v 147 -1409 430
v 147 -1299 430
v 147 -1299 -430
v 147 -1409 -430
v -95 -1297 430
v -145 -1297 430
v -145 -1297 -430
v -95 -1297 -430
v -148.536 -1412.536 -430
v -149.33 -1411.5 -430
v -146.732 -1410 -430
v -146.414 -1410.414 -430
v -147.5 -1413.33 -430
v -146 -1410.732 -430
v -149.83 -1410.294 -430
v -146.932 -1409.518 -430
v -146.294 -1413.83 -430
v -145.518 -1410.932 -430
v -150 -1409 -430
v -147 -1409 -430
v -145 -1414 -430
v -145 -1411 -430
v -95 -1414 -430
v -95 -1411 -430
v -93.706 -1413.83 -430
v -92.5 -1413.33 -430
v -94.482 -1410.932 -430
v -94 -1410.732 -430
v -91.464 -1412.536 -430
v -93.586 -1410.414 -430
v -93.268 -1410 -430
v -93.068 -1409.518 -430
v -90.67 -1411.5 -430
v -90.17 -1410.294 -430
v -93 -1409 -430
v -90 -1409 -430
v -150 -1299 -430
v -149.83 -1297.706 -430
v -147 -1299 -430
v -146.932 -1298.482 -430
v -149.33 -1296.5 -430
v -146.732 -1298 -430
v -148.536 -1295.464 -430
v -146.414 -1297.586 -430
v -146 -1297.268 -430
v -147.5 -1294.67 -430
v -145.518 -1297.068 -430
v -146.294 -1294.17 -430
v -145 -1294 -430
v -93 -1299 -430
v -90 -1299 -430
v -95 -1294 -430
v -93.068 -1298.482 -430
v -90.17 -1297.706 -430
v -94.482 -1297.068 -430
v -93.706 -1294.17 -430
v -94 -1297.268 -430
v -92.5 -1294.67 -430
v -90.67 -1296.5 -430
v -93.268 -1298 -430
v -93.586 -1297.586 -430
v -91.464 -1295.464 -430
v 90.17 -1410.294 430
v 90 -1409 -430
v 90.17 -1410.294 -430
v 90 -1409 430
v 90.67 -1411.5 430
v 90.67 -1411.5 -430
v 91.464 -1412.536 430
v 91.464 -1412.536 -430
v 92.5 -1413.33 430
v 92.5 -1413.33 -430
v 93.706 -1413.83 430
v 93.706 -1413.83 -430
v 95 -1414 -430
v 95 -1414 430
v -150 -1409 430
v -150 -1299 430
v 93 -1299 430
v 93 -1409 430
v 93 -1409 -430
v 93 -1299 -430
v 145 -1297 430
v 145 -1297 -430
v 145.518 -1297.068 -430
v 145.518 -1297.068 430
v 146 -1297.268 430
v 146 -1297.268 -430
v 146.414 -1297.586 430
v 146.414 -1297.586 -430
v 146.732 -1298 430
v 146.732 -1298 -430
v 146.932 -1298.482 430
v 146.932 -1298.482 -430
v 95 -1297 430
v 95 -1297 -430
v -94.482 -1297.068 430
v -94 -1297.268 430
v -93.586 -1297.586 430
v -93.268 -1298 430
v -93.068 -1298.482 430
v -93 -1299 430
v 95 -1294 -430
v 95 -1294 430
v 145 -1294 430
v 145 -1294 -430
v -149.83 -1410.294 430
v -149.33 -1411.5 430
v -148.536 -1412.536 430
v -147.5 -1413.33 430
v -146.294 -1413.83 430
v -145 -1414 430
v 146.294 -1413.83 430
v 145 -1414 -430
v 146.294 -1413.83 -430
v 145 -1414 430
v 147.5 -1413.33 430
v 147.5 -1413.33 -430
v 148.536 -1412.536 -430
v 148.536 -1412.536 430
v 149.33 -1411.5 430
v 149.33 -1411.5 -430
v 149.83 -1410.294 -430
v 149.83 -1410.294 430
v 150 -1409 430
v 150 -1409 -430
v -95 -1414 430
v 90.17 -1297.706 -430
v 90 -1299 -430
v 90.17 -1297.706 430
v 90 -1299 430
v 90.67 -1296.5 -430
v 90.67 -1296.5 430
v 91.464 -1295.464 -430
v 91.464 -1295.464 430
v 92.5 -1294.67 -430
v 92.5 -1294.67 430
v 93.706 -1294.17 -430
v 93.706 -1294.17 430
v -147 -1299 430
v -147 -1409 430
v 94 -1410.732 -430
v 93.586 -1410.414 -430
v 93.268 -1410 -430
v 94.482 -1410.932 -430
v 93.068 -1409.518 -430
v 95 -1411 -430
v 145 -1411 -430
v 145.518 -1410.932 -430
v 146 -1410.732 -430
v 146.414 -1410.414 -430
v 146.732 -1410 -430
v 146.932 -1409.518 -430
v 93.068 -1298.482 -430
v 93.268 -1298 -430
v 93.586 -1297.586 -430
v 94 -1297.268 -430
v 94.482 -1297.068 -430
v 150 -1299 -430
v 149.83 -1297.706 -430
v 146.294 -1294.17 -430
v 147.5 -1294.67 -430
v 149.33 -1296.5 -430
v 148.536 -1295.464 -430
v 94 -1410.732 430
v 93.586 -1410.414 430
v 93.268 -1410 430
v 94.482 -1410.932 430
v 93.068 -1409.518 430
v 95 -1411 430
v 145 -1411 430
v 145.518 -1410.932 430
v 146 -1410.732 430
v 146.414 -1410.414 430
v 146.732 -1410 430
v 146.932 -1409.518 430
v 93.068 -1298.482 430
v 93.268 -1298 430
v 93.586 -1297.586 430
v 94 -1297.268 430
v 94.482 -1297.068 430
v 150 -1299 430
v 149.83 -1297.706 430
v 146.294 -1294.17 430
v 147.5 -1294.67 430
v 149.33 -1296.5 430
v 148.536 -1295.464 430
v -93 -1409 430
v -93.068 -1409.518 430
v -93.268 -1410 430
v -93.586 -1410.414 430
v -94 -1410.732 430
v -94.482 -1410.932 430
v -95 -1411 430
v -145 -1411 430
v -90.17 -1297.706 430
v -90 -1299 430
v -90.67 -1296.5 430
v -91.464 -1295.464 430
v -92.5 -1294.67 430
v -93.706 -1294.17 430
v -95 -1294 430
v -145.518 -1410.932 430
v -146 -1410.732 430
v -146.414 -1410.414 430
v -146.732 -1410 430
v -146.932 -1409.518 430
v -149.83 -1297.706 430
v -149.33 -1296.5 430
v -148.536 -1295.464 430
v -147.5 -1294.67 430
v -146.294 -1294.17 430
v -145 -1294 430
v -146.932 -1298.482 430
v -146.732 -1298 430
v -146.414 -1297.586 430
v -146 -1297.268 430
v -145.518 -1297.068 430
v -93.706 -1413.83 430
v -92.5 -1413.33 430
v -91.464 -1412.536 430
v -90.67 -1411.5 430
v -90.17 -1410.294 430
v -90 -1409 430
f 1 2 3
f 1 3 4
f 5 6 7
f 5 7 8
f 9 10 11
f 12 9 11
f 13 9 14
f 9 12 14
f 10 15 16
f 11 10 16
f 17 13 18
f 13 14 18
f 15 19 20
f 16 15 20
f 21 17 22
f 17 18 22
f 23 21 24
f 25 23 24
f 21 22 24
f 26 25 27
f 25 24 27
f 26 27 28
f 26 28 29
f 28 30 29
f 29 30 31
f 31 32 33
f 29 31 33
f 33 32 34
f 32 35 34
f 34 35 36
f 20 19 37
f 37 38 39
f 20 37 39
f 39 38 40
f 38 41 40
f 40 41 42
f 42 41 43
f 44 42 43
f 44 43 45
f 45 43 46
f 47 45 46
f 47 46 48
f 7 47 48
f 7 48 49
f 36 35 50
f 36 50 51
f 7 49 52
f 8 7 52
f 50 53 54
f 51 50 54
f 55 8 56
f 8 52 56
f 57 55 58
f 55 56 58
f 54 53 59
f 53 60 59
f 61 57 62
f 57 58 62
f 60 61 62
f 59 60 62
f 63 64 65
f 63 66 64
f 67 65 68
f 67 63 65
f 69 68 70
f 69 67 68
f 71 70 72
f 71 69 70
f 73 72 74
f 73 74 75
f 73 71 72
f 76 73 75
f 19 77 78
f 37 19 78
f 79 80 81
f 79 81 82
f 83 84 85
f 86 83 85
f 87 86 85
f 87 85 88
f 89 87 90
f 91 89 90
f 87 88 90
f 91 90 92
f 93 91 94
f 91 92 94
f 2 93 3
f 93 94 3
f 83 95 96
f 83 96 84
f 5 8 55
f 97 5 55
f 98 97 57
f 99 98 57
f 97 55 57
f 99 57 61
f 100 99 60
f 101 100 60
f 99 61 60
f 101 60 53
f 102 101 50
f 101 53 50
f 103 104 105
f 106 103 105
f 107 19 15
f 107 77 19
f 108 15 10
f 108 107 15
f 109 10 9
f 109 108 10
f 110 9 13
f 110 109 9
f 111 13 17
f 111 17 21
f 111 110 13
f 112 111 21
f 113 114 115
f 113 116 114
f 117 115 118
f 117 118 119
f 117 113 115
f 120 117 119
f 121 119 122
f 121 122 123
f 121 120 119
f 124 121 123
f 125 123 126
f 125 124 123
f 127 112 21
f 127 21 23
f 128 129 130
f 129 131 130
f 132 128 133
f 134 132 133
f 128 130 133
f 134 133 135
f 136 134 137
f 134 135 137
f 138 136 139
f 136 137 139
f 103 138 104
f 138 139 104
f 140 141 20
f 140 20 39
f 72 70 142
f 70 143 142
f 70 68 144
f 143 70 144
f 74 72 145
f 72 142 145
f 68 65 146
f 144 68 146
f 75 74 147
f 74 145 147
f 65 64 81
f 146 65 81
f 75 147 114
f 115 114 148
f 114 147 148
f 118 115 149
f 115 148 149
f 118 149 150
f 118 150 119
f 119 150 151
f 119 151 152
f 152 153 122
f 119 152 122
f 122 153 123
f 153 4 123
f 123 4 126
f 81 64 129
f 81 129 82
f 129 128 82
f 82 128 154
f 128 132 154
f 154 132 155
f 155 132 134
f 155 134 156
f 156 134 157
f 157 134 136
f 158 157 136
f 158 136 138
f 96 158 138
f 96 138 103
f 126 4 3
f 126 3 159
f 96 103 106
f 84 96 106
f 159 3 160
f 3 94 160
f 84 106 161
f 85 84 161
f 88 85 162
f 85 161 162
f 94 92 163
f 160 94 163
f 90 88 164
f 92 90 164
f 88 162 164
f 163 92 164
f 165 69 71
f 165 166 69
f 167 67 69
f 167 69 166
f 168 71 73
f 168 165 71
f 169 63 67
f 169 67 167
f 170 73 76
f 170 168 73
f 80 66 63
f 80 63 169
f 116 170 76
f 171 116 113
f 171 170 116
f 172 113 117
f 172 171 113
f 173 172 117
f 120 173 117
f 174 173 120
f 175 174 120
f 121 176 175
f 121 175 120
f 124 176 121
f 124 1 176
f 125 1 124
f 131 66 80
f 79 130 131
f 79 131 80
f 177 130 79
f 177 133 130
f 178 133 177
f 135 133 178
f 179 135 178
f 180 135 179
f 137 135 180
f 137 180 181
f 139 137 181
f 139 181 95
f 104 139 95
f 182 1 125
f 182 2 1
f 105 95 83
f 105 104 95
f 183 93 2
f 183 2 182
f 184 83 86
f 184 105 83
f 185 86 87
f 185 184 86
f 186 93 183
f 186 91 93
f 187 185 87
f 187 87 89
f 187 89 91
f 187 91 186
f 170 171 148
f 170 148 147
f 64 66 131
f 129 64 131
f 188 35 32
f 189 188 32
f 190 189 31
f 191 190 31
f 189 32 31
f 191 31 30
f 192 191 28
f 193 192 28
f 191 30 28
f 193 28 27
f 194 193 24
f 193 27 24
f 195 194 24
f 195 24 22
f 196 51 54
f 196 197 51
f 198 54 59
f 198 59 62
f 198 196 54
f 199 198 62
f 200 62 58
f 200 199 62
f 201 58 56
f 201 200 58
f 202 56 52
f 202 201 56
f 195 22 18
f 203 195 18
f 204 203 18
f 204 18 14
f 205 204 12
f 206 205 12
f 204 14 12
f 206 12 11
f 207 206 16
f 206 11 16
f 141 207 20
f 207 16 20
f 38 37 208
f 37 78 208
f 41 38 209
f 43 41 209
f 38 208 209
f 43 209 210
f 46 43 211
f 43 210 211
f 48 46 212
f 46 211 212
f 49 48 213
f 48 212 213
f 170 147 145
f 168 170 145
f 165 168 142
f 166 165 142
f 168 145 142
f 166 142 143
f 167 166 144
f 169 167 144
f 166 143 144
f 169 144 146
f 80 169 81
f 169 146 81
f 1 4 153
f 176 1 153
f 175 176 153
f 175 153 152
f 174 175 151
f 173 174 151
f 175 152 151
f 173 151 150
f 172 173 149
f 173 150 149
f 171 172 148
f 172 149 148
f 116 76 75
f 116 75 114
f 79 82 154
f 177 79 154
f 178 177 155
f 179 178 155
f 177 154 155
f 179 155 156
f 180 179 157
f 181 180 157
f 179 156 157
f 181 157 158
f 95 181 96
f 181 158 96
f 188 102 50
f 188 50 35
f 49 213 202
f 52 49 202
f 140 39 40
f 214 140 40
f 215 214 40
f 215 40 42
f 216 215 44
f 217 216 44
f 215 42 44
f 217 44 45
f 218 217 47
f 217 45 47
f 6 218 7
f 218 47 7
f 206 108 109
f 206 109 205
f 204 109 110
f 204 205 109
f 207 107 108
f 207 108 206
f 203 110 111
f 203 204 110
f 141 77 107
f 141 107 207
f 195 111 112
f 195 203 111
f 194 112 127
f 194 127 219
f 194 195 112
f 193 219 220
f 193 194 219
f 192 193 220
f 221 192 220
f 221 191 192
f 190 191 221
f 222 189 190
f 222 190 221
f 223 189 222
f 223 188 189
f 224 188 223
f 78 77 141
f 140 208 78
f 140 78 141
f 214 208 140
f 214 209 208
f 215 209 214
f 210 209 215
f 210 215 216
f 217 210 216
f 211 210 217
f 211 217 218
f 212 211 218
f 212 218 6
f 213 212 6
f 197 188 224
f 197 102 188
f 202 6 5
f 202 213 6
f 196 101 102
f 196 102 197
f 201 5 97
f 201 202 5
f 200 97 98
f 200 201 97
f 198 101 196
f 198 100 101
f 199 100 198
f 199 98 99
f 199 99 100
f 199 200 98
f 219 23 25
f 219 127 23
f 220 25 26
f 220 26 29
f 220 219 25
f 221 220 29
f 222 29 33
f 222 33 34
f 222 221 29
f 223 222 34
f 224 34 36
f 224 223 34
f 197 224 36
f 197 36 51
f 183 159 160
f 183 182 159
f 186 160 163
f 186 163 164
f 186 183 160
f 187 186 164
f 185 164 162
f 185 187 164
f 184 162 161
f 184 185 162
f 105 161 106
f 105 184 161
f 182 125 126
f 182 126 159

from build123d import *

# Parameters (mm, degrees)
BOSS_EXTRUDE3_DEPTH        = 430
BOSS_EXTRUDE3_DEPTH_BACK   = 430
SKETCH1_W                  = 60
SKETCH1_H                  = 120
BOSS_EXTRUDE3_2_DEPTH      = 430
BOSS_EXTRUDE3_2_DEPTH_BACK = 430
FILLET1_R                  = 5
FILLET2_R                  = 5
SHELL4_START               = -427
SHELL4_DEPTH               = 854
SHELL5_START               = -427
SHELL5_DEPTH               = 854
CUT_EXTRUDE1_DEPTH         = 1662.774954679


# Read off the part's stored shape, not the designer's step: Shell4, Shell5
with BuildPart() as part:
    # Sketch1 → Boss-Extrude3 (new, two sides: drawn at the far end of the back side and taken through both)
    with BuildSketch(Plane.XY.offset(-BOSS_EXTRUDE3_DEPTH_BACK)):
        with Locations((120, -1354)):
            Rectangle(SKETCH1_W, SKETCH1_H)
    extrude(amount=BOSS_EXTRUDE3_DEPTH + BOSS_EXTRUDE3_DEPTH_BACK)

    # Fillet1
    fillet1_edges = [part.edges().sort_by_distance(p)[0] for p in [
        (150, -1294, 0),
        (90, -1294, 0),
        (90, -1414, 0),
        (150, -1414, 0),
    ]]
    fillet(fillet1_edges, radius=FILLET1_R)

    # Shell4 outline → Shell4 (cut)
    with BuildSketch(Plane.XY.offset(SHELL4_START)):
        with BuildLine():
            ThreePointArc((147, -1299), (146.414213562, -1297.585786438), (145, -1297))
            Line((145, -1297), (95, -1297))
            ThreePointArc((95, -1297), (93.585786438, -1297.585786438), (93, -1299))
            Line((93, -1299), (93, -1409))
            ThreePointArc((93, -1409), (93.585786438, -1410.414213562), (95, -1411))
            Line((95, -1411), (145, -1411))
            ThreePointArc((145, -1411), (146.414213562, -1410.414213562), (147, -1409))
            Line((147, -1409), (147, -1299))
        make_face()
    extrude(amount=SHELL4_DEPTH, mode=Mode.SUBTRACT)


with BuildPart() as body_2:
    # Sketch1 → Boss-Extrude3 2 (new, two sides: drawn at the far end of the back side and taken through both)
    with BuildSketch(Plane.XY.offset(-BOSS_EXTRUDE3_2_DEPTH_BACK)):
        with Locations((-120, -1354)):
            Rectangle(SKETCH1_W, SKETCH1_H)
    extrude(amount=BOSS_EXTRUDE3_2_DEPTH + BOSS_EXTRUDE3_2_DEPTH_BACK)

    # Fillet2
    fillet2_edges = [body_2.edges().sort_by_distance(p)[0] for p in [
        (-150, -1294, 0),
        (-150, -1414, 0),
        (-90, -1414, 0),
        (-90, -1294, 0),
    ]]
    fillet(fillet2_edges, radius=FILLET2_R)

    # Shell5 outline → Shell5 (cut)
    with BuildSketch(Plane.XY.offset(SHELL5_START)):
        with BuildLine():
            ThreePointArc((-145, -1297), (-146.414213562, -1297.585786438), (-147, -1299))
            Line((-147, -1299), (-147, -1409))
            ThreePointArc((-147, -1409), (-146.414213562, -1410.414213562), (-145, -1411))
            Line((-145, -1411), (-95, -1411))
            ThreePointArc((-95, -1411), (-93.585786438, -1410.414213562), (-93, -1409))
            Line((-93, -1409), (-93, -1299))
            ThreePointArc((-93, -1299), (-93.585786438, -1297.585786438), (-95, -1297))
            Line((-95, -1297), (-145, -1297))
        make_face()
    extrude(amount=SHELL5_DEPTH, mode=Mode.SUBTRACT)


with BuildPart() as cut_extrude1_tool:
    # Sketch2 → Cut-Extrude1 (new, through all)
    with BuildSketch(Plane(origin=(0, 0, -430), x_dir=(-1, 0, 0), z_dir=(0, 0, -1))):
        with BuildLine():
            Line((-145, -1411), (-95, -1411))
            ThreePointArc((-95, -1411), (-93.585786438, -1410.414213562), (-93, -1409))
            Line((-93, -1409), (-93, -1299))
            ThreePointArc((-93, -1299), (-93.585786438, -1297.585786438), (-95, -1297))
            Line((-95, -1297), (-145, -1297))
            ThreePointArc((-145, -1297), (-146.414213562, -1297.585786438), (-147, -1299))
            Line((-147, -1299), (-147, -1409))
            ThreePointArc((-147, -1409), (-146.414213562, -1410.414213562), (-145, -1411))
        make_face()
        with BuildLine():
            Line((95, -1411), (145, -1411))
            ThreePointArc((145, -1411), (146.414213562, -1410.414213562), (147, -1409))
            Line((147, -1409), (147, -1299))
            ThreePointArc((147, -1299), (146.414213562, -1297.585786438), (145, -1297))
            Line((145, -1297), (95, -1297))
            ThreePointArc((95, -1297), (93.585786438, -1297.585786438), (93, -1299))
            Line((93, -1299), (93, -1409))
            ThreePointArc((93, -1409), (93.585786438, -1410.414213562), (95, -1411))
        make_face()
    extrude(amount=-CUT_EXTRUDE1_DEPTH)


with BuildPart() as part_1:
    add(part.part)

    # Cut-Extrude1: cut by cut_extrude1_tool
    add(cut_extrude1_tool.part, mode=Mode.SUBTRACT)


with BuildPart() as body_2_1:
    add(body_2.part)

    # Cut-Extrude1: cut by cut_extrude1_tool
    add(cut_extrude1_tool.part, mode=Mode.SUBTRACT)


solid = Compound([part_1.part, body_2_1.part])
